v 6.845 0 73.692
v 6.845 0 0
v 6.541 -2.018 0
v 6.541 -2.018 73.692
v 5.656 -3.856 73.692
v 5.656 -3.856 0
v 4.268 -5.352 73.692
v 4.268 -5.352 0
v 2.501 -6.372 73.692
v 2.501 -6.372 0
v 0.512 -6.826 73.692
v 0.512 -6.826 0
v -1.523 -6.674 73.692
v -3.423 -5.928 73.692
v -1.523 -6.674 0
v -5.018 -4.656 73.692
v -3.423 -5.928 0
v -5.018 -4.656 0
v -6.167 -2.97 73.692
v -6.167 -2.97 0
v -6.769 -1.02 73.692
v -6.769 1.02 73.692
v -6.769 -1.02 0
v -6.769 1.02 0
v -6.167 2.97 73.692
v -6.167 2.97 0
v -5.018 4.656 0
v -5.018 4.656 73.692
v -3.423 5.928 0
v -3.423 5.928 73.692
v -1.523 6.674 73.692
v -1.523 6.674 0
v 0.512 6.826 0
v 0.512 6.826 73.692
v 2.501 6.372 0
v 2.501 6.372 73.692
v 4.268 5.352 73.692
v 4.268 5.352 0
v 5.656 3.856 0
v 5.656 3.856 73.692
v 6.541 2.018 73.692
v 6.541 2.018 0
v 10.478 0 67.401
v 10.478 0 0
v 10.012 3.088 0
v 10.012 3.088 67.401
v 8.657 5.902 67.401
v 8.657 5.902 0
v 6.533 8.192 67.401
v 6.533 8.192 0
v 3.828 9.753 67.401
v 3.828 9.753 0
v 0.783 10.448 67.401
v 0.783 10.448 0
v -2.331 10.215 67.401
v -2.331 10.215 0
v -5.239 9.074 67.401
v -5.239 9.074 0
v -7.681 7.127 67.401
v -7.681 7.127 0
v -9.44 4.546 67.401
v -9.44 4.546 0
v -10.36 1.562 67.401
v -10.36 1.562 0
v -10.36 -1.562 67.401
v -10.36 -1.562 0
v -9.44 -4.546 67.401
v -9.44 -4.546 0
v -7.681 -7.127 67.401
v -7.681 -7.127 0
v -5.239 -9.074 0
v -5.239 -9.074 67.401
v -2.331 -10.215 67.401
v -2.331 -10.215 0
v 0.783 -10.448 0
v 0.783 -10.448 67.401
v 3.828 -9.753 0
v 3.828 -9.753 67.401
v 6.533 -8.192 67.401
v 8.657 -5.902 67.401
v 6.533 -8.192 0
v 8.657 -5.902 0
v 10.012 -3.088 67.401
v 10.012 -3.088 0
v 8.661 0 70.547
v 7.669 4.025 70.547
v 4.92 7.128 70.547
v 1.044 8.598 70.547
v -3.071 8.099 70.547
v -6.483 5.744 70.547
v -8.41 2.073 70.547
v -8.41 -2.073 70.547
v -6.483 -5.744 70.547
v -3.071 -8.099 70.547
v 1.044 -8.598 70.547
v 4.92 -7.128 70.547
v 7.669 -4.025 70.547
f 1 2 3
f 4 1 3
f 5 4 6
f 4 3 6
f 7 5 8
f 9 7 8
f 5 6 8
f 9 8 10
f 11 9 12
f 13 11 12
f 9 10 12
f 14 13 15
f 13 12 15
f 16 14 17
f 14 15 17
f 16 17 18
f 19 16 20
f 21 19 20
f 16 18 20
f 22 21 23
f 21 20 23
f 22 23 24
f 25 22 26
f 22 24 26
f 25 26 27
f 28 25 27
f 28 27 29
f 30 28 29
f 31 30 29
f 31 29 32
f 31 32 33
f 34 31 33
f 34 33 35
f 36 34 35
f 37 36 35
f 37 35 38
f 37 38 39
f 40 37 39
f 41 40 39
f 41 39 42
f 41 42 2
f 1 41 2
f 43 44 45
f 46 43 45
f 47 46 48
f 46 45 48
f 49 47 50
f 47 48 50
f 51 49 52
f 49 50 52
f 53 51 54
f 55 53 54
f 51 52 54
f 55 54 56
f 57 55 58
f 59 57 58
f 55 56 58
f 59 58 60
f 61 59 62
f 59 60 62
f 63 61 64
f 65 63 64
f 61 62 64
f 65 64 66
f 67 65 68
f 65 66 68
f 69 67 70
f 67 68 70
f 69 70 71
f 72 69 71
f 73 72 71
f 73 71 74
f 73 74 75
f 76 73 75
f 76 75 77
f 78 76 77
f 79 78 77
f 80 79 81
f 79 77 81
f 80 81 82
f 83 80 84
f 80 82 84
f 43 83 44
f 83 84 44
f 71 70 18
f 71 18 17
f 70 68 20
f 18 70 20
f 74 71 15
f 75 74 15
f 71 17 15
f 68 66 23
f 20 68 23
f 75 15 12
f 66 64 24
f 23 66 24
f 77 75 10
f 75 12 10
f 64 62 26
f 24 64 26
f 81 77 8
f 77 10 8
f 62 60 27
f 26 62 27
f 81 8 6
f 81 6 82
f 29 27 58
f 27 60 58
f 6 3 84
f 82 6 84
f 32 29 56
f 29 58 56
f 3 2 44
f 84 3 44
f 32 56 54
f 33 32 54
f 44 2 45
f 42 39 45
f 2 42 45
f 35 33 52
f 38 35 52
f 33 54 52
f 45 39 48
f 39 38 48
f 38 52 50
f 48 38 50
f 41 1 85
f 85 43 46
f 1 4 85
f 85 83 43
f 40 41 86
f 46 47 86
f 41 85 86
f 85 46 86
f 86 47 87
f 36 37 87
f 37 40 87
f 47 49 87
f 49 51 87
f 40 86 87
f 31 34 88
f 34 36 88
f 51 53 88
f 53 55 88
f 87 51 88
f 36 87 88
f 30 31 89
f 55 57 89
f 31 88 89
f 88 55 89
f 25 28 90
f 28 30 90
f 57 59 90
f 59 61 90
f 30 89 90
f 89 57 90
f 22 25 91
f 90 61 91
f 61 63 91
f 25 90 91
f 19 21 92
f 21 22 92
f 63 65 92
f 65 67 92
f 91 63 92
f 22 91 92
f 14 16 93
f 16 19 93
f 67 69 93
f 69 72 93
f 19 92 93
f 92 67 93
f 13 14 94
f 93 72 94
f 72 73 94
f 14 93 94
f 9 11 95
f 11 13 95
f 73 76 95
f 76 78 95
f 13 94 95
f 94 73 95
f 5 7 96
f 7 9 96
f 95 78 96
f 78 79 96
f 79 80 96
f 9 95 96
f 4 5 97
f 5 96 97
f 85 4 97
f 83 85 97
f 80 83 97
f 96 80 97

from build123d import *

# Parameters (mm, degrees)
F0_R     = 10.4775
F1_DEPTH = 76.2
F2_SIZE2 = 8.7988181024
F2_SIZE  = 5.08
F3_R     = 6.8453
F4_DEPTH = 76.201


with BuildPart() as f1:
    # F0 (on Top) → F1 (new body)
    with BuildSketch(Plane.XY):
        Circle(F0_R)
    extrude(amount=F1_DEPTH)

    # F2
    f2_edges = [f1.edges().sort_by_distance(p)[0] for p in [
        (-10.4775, 0, 76.2),
    ]]
    f2_side = f1.faces().sort_by_distance((0, 0, 76.2))[0]
    chamfer(f2_edges, length=F2_SIZE, length2=F2_SIZE2, reference=f2_side)

    # F3 (on face) → F4 (cut, through all)
    with BuildSketch(Plane(origin=(0, 0, 0), x_dir=(1, 0, 0), z_dir=(0, 0, -1))):
        Circle(F3_R)
    extrude(amount=-F4_DEPTH, mode=Mode.SUBTRACT)


solid = f1.part
